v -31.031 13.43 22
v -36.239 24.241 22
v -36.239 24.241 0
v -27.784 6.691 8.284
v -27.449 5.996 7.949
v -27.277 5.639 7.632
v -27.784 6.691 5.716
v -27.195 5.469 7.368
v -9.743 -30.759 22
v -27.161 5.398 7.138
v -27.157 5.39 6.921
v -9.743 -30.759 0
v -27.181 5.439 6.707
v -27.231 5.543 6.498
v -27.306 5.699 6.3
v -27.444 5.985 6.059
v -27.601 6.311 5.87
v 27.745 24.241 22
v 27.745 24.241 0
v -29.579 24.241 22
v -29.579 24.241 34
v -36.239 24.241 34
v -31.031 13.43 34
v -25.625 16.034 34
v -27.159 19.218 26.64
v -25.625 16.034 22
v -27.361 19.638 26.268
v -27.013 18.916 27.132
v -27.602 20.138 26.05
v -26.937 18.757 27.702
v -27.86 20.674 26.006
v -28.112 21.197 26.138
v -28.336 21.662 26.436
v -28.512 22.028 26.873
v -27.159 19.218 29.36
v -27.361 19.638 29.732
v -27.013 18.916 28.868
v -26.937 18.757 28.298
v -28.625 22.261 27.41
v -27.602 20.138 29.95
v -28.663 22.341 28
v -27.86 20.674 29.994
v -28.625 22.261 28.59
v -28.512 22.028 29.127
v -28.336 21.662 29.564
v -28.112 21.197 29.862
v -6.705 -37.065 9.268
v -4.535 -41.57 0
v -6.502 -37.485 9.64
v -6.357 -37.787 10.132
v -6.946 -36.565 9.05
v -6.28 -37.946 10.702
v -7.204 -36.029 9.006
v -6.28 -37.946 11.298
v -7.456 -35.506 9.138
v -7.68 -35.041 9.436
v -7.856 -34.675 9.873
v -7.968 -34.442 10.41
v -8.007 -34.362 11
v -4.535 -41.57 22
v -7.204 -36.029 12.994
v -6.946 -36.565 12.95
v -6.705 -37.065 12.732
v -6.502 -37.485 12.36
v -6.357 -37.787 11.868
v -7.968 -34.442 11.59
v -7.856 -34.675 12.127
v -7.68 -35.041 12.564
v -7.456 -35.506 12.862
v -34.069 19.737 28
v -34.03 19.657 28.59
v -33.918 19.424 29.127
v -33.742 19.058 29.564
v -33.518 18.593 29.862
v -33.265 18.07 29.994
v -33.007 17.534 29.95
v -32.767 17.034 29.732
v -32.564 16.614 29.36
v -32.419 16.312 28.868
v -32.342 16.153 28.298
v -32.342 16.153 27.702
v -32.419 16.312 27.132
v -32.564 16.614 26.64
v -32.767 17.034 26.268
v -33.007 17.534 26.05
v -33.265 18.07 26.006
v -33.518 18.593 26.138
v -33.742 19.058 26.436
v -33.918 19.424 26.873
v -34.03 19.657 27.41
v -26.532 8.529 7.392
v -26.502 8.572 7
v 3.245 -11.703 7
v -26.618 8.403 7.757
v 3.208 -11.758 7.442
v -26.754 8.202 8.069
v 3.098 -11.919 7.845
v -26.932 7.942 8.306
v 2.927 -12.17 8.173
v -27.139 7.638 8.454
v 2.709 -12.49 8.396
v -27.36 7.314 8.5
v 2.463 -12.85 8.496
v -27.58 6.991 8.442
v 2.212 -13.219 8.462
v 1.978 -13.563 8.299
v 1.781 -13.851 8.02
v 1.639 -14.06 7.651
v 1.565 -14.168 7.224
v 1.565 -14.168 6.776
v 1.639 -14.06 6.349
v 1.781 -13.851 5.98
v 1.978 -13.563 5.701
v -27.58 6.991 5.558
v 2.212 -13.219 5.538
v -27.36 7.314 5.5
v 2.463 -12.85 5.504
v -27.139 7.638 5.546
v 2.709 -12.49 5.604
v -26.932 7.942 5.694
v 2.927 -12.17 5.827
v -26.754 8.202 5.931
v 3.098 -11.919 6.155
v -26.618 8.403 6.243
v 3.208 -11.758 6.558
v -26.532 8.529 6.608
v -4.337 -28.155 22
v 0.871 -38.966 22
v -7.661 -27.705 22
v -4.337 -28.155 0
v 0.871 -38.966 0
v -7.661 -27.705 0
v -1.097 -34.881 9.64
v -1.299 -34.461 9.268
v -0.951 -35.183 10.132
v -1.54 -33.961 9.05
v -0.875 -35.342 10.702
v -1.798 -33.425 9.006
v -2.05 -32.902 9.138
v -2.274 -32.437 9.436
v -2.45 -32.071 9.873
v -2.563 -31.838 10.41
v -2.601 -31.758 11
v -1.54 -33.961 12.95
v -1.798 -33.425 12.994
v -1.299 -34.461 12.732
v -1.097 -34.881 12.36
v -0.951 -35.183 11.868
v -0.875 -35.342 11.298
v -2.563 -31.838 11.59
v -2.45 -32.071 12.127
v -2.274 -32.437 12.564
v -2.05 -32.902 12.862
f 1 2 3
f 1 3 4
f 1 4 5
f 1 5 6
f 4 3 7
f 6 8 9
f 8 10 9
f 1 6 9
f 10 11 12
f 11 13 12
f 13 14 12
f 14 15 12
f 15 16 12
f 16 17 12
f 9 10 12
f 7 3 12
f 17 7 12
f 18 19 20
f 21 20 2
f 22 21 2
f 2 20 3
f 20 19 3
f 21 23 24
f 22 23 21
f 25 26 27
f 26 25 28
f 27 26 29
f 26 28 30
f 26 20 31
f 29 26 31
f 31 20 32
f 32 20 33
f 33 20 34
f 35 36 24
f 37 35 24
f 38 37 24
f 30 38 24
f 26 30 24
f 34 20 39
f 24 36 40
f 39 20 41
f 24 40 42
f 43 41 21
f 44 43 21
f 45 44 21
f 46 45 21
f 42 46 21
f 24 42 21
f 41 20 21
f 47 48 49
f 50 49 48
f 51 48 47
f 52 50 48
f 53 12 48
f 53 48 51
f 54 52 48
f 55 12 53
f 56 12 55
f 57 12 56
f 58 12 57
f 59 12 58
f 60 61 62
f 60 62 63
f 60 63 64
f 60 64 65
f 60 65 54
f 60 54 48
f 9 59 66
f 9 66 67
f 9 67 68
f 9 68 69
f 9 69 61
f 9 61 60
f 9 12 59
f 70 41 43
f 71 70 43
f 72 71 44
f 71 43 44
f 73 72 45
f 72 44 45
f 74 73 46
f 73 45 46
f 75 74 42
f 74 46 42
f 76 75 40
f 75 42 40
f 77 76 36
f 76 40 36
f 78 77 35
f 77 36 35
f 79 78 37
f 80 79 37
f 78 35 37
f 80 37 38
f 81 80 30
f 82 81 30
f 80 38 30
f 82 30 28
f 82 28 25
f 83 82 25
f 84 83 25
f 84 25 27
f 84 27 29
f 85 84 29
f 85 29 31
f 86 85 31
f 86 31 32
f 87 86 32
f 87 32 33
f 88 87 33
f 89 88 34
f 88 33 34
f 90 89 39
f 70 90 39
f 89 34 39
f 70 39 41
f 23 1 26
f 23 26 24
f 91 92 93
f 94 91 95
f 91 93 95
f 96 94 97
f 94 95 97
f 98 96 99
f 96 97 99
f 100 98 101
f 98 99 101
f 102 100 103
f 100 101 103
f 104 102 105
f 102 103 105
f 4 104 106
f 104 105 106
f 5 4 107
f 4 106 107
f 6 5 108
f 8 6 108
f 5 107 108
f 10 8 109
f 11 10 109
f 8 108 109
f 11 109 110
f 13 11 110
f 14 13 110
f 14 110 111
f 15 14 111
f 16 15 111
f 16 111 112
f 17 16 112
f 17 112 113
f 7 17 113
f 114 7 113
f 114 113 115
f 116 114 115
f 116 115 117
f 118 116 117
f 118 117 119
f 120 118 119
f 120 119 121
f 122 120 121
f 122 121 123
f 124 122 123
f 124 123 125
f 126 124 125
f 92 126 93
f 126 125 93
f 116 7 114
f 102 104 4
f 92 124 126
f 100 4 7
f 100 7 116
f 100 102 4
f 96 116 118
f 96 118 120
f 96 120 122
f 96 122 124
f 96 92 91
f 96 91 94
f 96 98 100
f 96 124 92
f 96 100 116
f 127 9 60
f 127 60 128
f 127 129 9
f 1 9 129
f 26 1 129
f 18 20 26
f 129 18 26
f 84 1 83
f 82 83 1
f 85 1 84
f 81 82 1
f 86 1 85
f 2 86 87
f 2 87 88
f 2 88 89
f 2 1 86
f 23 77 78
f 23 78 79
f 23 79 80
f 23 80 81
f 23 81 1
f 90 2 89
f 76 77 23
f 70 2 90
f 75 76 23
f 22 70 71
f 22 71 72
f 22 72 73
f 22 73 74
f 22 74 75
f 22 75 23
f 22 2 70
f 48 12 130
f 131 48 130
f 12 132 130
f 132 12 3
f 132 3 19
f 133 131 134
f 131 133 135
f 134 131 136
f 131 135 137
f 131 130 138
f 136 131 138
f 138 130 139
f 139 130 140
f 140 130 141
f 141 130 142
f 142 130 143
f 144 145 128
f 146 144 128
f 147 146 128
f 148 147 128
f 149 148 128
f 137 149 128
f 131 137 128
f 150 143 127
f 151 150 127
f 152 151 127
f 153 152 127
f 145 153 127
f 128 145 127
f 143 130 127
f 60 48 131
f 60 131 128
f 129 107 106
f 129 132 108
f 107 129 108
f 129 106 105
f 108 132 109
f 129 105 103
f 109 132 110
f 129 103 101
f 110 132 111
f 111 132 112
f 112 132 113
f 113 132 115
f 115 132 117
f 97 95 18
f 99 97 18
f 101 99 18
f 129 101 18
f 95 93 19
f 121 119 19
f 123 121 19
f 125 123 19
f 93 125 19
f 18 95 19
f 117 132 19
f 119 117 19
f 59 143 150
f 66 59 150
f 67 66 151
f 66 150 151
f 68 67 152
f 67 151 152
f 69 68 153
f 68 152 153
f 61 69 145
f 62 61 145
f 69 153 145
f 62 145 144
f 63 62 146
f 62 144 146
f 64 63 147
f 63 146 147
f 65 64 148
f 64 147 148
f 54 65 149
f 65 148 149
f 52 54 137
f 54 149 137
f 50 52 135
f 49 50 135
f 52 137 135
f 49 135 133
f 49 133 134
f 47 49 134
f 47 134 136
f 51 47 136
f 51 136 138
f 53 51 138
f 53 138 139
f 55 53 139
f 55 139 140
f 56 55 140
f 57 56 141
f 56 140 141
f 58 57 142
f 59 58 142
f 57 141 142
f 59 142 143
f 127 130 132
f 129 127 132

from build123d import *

# Parameters (mm, degrees)
BOSS_EXTRUDE1_DEPTH = 22
SKETCH6_W           = 12
SKETCH6_H           = 12
SKETCH6_W_2         = 22
BOSS_EXTRUDE4_DEPTH = 6
BOSS_EXTRUDE5_DEPTH = 22
SKETCH9_R           = 2
CUT_EXTRUDE9_DEPTH  = 6
SKETCH10_R          = 1.5
CUT_EXTRUDE10_DEPTH = 36
CUT_EXTRUDE11_DEPTH = 20


with BuildPart() as part:
    # Sketch1 → Boss-Extrude1 (new body)
    with BuildSketch(Plane.XY):
        Polygon((-36.238637744, 24.241346543), (-9.742760301, -30.758653457), (27.744579766, 24.241346543), align=None)
    extrude(amount=BOSS_EXTRUDE1_DEPTH)

    # Sketch6 → Boss-Extrude4 (add)
    with BuildSketch(Plane(origin=(-19.934259386, -9.603194429, 0), x_dir=(0, 0, 1), z_dir=(-0.9009094793526655, -0.4340070391278342, 0))):
        with Locations((28, 31.567082762)):
            Rectangle(SKETCH6_W, SKETCH6_H)
        with Locations((11, -29.48233592)):
            Rectangle(SKETCH6_W_2, SKETCH6_H)
    extrude(amount=-BOSS_EXTRUDE4_DEPTH)


with BuildPart() as boss_extrude4_piece_1:
    # of the separate pieces the step leaves, piece 1, a body of its own (boss_extrude4_pieces)
    add(part.part.solids().sort_by_distance((-36.238637744, 24.241346543, 0))[0])



with BuildPart() as boss_extrude4_piece_2:
    # of the separate pieces the step leaves, piece 2, a body of its own (boss_extrude4_pieces)
    add(part.part.solids().sort_by_distance((-4.337303425, -28.154611222, 0))[0])


with BuildPart() as boss_extrude4_piece_1_1:
    add(boss_extrude4_piece_1.part)

    add(boss_extrude4_piece_2.part)  # Boss-Extrude5 merges Boss-Extrude4 piece 2
    # Sketch8 → Boss-Extrude5 (add)
    with BuildSketch(Plane(origin=(0, 0, 0), x_dir=(-1, 0, 0), z_dir=(0, 0, -1))):
        Polygon((9.742760301, -30.758653457), (4.337303425, -28.154611222), (7.661322683, -27.704847324), align=None)
    extrude(amount=-BOSS_EXTRUDE5_DEPTH)

    # Sketch9 → Cut-Extrude9 (cut)
    with BuildSketch(Plane(origin=(-14.52880251, -6.999152194, 0), x_dir=(0, 0, -1), z_dir=(0.9009094793526653, 0.43400703912783434, 0))):
        with Locations(Location((-28, 30.567082762, 0), (0, 0, 90))):
            Circle(SKETCH9_R)
        with Locations(Location((-11, -29.48233592, 0), (0, 0, 90))):
            Circle(SKETCH9_R)
    extrude(amount=-CUT_EXTRUDE9_DEPTH, mode=Mode.SUBTRACT)

    # Sketch10 → Cut-Extrude10 (cut)
    with BuildSketch(Plane(origin=(7.662336774, -5.222556806, 0), x_dir=(0, 0, -1), z_dir=(0.8263158609823067, -0.5632069760656995, 0))):
        with Locations(Location((-7, -9.343049988, 0), (0, 0, 90))):
            Circle(SKETCH10_R)
    extrude(amount=-CUT_EXTRUDE10_DEPTH, mode=Mode.SUBTRACT)

    # Sketch12 → Cut-Extrude11 (cut)
    with BuildSketch(Plane(origin=(0, 0, 22), x_dir=(-1, 0, 0), z_dir=(0, 0, -1))):
        Polygon((30.833180868, 26.845388778), (29.578701161, 24.241346543), (36.238637744, 24.241346543), align=None)
    extrude(amount=-CUT_EXTRUDE11_DEPTH, mode=Mode.SUBTRACT)


solid = boss_extrude4_piece_1_1.part
